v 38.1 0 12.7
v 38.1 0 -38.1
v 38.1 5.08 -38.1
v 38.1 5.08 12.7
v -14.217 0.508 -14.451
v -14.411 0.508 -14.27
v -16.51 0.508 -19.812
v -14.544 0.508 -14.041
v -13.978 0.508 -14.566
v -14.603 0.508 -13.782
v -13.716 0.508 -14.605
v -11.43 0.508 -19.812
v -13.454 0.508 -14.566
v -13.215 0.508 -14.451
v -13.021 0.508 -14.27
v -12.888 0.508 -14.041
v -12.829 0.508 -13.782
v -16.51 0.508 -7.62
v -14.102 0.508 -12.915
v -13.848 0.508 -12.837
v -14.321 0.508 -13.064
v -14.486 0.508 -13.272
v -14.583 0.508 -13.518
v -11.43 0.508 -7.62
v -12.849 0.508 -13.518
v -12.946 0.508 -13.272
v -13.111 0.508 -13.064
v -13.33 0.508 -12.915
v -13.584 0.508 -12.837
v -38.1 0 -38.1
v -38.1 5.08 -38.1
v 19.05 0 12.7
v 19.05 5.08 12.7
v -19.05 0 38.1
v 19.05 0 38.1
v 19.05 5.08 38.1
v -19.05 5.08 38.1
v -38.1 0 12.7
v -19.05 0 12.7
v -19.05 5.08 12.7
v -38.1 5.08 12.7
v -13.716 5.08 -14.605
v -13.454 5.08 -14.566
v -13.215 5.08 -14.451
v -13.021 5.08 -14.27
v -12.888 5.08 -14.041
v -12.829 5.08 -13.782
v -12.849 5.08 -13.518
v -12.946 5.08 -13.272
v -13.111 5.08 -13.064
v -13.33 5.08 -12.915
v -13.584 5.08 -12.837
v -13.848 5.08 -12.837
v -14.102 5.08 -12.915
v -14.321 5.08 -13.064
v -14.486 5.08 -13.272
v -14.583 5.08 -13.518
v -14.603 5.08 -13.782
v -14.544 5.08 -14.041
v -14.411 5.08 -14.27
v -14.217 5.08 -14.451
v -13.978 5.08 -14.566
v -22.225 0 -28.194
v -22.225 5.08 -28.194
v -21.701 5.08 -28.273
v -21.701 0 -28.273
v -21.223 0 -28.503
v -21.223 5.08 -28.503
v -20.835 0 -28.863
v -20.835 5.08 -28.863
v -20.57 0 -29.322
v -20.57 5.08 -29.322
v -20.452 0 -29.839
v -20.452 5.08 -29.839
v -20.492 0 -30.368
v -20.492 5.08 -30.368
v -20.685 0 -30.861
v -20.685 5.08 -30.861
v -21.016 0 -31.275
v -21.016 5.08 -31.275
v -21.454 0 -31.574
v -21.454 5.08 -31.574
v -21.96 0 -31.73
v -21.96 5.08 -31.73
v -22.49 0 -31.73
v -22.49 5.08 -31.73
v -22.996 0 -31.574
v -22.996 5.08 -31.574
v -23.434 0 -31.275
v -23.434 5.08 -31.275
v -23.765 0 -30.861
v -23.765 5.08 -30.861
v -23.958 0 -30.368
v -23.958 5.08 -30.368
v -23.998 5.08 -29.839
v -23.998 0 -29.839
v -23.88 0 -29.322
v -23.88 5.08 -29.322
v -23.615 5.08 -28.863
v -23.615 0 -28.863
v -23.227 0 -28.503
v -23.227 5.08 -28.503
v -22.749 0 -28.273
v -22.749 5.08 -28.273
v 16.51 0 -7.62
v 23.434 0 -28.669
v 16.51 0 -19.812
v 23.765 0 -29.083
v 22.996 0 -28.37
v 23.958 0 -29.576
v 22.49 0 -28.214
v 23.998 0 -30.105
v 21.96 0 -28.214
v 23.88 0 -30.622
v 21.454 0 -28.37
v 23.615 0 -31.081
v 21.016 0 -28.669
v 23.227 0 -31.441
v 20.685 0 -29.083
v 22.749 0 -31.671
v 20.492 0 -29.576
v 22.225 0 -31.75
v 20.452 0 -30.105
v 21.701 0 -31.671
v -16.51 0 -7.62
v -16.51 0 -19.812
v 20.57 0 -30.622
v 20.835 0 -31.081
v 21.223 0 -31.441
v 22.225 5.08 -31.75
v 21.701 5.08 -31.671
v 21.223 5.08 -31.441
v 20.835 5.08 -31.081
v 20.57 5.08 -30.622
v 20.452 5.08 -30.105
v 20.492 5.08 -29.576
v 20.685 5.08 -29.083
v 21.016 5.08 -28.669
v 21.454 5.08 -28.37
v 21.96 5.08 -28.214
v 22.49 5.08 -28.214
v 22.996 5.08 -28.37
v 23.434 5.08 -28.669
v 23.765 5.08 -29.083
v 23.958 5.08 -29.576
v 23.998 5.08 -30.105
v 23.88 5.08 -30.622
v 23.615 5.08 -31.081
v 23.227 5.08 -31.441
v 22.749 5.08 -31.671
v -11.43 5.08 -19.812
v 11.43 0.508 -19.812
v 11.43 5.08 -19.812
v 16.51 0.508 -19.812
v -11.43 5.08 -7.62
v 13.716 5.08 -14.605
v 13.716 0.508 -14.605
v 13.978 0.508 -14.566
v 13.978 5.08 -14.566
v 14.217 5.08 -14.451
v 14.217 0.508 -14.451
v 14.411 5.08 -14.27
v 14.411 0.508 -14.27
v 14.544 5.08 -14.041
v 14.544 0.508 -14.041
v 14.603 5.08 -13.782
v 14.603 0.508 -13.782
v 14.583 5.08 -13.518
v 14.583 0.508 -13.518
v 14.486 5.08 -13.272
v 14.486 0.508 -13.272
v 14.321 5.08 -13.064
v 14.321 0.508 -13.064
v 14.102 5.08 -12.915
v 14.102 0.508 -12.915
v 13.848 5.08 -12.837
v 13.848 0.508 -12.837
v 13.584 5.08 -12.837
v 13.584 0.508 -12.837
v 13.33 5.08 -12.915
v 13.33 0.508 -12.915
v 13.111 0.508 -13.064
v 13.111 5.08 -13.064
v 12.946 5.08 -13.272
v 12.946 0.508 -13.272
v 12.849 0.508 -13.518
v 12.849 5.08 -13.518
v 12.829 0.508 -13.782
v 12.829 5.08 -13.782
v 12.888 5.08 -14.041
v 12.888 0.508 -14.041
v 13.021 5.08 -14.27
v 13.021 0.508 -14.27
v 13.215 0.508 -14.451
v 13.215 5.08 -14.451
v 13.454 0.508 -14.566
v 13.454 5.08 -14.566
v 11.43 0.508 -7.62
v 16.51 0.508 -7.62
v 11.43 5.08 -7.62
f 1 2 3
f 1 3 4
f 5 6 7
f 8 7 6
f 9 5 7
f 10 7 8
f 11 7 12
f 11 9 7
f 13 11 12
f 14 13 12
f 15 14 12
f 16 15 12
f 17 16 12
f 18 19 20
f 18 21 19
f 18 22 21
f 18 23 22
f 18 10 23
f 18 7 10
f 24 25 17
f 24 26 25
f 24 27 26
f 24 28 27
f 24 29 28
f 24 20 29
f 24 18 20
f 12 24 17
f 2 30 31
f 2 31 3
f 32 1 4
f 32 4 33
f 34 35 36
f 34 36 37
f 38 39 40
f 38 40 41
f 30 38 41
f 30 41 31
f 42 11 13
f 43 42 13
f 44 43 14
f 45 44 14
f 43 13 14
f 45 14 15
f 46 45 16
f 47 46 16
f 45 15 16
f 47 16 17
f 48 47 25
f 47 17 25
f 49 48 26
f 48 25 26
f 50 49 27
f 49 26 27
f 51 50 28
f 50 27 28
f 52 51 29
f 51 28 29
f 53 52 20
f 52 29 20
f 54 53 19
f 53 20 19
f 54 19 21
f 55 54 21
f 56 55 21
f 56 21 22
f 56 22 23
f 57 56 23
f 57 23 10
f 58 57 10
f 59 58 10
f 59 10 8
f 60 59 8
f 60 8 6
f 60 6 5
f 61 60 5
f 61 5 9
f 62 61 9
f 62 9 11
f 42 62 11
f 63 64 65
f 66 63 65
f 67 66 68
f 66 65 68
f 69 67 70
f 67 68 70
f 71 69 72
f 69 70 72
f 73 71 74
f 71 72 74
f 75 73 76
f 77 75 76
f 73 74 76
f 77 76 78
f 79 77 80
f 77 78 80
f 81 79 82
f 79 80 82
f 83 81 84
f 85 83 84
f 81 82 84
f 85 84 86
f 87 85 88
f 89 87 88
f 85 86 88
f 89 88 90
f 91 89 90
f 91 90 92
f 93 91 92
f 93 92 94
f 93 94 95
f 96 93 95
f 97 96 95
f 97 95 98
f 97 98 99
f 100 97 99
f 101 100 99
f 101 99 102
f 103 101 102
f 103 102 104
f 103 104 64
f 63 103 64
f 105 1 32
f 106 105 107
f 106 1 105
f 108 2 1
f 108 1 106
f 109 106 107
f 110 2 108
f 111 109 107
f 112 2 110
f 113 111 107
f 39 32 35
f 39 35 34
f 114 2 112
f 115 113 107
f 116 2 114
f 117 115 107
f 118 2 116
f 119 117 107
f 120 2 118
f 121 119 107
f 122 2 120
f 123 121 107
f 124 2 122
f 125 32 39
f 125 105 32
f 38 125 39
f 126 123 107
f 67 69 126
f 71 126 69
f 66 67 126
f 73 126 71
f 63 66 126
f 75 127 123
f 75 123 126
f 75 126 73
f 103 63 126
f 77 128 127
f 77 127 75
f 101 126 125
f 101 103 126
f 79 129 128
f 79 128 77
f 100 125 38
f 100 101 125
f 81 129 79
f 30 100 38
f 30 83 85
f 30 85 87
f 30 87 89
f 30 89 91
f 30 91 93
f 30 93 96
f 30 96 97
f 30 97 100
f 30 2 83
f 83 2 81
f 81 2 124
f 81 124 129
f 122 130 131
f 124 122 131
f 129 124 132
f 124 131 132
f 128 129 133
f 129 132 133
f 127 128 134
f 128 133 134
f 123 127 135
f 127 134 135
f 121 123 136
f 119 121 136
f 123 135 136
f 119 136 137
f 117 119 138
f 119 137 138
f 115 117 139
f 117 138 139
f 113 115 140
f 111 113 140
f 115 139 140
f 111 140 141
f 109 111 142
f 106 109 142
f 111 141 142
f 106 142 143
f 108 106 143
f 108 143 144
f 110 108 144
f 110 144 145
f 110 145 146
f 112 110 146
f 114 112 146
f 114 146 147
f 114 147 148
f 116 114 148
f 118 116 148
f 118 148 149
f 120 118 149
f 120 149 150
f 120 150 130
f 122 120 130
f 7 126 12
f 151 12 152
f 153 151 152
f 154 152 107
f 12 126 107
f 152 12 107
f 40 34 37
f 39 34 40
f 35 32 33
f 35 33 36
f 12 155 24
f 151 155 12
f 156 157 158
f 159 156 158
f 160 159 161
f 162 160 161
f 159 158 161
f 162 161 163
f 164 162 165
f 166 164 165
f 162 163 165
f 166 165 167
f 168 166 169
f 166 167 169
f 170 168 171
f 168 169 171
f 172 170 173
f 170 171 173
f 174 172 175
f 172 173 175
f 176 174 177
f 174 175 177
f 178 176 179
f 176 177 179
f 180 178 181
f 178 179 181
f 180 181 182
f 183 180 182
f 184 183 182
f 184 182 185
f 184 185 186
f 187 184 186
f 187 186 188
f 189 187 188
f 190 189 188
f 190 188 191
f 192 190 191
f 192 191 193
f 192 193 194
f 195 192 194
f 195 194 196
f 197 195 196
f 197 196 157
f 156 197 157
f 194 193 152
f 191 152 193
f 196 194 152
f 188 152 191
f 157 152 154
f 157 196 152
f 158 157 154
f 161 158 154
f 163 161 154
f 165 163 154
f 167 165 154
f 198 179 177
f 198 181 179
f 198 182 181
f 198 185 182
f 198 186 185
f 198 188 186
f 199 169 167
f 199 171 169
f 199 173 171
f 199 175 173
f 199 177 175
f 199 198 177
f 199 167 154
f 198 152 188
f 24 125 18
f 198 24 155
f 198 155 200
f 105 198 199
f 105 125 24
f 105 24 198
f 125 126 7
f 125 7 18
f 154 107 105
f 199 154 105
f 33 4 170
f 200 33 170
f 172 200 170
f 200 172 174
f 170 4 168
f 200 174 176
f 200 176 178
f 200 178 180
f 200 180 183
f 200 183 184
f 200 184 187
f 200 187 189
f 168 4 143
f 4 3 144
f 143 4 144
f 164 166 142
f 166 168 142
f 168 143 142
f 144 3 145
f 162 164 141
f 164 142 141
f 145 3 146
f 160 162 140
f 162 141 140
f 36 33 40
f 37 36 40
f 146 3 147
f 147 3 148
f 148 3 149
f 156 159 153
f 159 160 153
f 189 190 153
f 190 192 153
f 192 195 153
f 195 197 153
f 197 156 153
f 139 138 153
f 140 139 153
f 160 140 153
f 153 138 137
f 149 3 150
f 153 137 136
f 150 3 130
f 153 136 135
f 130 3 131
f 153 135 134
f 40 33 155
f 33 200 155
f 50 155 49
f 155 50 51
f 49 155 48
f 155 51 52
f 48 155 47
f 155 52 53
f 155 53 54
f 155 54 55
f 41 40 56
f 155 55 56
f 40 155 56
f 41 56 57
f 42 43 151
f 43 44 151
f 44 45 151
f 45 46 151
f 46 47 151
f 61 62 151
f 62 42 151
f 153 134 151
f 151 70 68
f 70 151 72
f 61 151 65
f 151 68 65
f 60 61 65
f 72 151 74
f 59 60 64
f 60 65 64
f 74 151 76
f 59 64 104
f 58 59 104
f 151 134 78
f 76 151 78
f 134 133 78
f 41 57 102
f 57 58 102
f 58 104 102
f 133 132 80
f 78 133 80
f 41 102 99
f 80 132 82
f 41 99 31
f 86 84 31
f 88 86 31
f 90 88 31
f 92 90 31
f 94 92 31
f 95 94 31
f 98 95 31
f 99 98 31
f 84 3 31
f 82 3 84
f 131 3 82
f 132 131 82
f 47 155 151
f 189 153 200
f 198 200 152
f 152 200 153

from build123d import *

# Parameters (mm, degrees)
BOSS_EXTRUDE1_DEPTH = 5.08
SKETCH2_R           = 1.778
CUT_EXTRUDE1_DEPTH  = 55.120480412
SKETCH3_W           = 22.86
SKETCH3_H           = 12.192
CUT_EXTRUDE2_DEPTH  = 4.572
SKETCH4_W           = 33.02
SKETCH4_H           = 12.192
CUT_EXTRUDE3_DEPTH  = 0.508
SKETCH5_R           = 0.889
CUT_EXTRUDE4_DEPTH  = 55.075162358


with BuildPart() as part:
    # Sketch1 → Boss-Extrude1 (new body)
    with BuildSketch(Plane(origin=(0, 0, 0), x_dir=(1, 0, 0), z_dir=(0, 1, 0))):
        Polygon((-38.1, -12.7), (-38.1, 38.1), (38.1, 38.1), (38.1, -12.7), (19.05, -12.7), (19.05, -38.1), (-19.05, -38.1), (-19.05, -12.7), align=None)
    extrude(amount=BOSS_EXTRUDE1_DEPTH)

    # Sketch2 → Cut-Extrude1 (cut, through all)
    with BuildSketch(Plane(origin=(0, 5.08, 0), x_dir=(1, 0, 0), z_dir=(0, 1, 0))):
        with Locations(Location((-22.225, 29.972, 0), (0, 0, 270))):
            Circle(SKETCH2_R)
        with Locations(Location((22.225, 29.972, 0), (0, 0, 90))):
            Circle(SKETCH2_R)
    extrude(amount=-CUT_EXTRUDE1_DEPTH, mode=Mode.SUBTRACT)

    # Sketch3 → Cut-Extrude2 (cut)
    with BuildSketch(Plane(origin=(0, 5.08, 0), x_dir=(1, 0, 0), z_dir=(0, 1, 0))):
        with Locations((0, 13.716)):
            Rectangle(SKETCH3_W, SKETCH3_H)
    extrude(amount=-CUT_EXTRUDE2_DEPTH, mode=Mode.SUBTRACT)

    # Sketch4 → Cut-Extrude3 (cut)
    with BuildSketch(Plane.XZ):
        with Locations((0, -13.716)):
            Rectangle(SKETCH4_W, SKETCH4_H)
    extrude(amount=-CUT_EXTRUDE3_DEPTH, mode=Mode.SUBTRACT)

    # Sketch5 → Cut-Extrude4 (cut, through all)
    with BuildSketch(Plane.XZ.offset(-0.508)):
        with Locations(Location((-13.716, -13.716, 0), (0, 0, 270))):
            Circle(SKETCH5_R)
        with Locations(Location((13.716, -13.716, 0), (0, 0, 270))):
            Circle(SKETCH5_R)
    extrude(amount=-CUT_EXTRUDE4_DEPTH, mode=Mode.SUBTRACT)


solid = part.part
